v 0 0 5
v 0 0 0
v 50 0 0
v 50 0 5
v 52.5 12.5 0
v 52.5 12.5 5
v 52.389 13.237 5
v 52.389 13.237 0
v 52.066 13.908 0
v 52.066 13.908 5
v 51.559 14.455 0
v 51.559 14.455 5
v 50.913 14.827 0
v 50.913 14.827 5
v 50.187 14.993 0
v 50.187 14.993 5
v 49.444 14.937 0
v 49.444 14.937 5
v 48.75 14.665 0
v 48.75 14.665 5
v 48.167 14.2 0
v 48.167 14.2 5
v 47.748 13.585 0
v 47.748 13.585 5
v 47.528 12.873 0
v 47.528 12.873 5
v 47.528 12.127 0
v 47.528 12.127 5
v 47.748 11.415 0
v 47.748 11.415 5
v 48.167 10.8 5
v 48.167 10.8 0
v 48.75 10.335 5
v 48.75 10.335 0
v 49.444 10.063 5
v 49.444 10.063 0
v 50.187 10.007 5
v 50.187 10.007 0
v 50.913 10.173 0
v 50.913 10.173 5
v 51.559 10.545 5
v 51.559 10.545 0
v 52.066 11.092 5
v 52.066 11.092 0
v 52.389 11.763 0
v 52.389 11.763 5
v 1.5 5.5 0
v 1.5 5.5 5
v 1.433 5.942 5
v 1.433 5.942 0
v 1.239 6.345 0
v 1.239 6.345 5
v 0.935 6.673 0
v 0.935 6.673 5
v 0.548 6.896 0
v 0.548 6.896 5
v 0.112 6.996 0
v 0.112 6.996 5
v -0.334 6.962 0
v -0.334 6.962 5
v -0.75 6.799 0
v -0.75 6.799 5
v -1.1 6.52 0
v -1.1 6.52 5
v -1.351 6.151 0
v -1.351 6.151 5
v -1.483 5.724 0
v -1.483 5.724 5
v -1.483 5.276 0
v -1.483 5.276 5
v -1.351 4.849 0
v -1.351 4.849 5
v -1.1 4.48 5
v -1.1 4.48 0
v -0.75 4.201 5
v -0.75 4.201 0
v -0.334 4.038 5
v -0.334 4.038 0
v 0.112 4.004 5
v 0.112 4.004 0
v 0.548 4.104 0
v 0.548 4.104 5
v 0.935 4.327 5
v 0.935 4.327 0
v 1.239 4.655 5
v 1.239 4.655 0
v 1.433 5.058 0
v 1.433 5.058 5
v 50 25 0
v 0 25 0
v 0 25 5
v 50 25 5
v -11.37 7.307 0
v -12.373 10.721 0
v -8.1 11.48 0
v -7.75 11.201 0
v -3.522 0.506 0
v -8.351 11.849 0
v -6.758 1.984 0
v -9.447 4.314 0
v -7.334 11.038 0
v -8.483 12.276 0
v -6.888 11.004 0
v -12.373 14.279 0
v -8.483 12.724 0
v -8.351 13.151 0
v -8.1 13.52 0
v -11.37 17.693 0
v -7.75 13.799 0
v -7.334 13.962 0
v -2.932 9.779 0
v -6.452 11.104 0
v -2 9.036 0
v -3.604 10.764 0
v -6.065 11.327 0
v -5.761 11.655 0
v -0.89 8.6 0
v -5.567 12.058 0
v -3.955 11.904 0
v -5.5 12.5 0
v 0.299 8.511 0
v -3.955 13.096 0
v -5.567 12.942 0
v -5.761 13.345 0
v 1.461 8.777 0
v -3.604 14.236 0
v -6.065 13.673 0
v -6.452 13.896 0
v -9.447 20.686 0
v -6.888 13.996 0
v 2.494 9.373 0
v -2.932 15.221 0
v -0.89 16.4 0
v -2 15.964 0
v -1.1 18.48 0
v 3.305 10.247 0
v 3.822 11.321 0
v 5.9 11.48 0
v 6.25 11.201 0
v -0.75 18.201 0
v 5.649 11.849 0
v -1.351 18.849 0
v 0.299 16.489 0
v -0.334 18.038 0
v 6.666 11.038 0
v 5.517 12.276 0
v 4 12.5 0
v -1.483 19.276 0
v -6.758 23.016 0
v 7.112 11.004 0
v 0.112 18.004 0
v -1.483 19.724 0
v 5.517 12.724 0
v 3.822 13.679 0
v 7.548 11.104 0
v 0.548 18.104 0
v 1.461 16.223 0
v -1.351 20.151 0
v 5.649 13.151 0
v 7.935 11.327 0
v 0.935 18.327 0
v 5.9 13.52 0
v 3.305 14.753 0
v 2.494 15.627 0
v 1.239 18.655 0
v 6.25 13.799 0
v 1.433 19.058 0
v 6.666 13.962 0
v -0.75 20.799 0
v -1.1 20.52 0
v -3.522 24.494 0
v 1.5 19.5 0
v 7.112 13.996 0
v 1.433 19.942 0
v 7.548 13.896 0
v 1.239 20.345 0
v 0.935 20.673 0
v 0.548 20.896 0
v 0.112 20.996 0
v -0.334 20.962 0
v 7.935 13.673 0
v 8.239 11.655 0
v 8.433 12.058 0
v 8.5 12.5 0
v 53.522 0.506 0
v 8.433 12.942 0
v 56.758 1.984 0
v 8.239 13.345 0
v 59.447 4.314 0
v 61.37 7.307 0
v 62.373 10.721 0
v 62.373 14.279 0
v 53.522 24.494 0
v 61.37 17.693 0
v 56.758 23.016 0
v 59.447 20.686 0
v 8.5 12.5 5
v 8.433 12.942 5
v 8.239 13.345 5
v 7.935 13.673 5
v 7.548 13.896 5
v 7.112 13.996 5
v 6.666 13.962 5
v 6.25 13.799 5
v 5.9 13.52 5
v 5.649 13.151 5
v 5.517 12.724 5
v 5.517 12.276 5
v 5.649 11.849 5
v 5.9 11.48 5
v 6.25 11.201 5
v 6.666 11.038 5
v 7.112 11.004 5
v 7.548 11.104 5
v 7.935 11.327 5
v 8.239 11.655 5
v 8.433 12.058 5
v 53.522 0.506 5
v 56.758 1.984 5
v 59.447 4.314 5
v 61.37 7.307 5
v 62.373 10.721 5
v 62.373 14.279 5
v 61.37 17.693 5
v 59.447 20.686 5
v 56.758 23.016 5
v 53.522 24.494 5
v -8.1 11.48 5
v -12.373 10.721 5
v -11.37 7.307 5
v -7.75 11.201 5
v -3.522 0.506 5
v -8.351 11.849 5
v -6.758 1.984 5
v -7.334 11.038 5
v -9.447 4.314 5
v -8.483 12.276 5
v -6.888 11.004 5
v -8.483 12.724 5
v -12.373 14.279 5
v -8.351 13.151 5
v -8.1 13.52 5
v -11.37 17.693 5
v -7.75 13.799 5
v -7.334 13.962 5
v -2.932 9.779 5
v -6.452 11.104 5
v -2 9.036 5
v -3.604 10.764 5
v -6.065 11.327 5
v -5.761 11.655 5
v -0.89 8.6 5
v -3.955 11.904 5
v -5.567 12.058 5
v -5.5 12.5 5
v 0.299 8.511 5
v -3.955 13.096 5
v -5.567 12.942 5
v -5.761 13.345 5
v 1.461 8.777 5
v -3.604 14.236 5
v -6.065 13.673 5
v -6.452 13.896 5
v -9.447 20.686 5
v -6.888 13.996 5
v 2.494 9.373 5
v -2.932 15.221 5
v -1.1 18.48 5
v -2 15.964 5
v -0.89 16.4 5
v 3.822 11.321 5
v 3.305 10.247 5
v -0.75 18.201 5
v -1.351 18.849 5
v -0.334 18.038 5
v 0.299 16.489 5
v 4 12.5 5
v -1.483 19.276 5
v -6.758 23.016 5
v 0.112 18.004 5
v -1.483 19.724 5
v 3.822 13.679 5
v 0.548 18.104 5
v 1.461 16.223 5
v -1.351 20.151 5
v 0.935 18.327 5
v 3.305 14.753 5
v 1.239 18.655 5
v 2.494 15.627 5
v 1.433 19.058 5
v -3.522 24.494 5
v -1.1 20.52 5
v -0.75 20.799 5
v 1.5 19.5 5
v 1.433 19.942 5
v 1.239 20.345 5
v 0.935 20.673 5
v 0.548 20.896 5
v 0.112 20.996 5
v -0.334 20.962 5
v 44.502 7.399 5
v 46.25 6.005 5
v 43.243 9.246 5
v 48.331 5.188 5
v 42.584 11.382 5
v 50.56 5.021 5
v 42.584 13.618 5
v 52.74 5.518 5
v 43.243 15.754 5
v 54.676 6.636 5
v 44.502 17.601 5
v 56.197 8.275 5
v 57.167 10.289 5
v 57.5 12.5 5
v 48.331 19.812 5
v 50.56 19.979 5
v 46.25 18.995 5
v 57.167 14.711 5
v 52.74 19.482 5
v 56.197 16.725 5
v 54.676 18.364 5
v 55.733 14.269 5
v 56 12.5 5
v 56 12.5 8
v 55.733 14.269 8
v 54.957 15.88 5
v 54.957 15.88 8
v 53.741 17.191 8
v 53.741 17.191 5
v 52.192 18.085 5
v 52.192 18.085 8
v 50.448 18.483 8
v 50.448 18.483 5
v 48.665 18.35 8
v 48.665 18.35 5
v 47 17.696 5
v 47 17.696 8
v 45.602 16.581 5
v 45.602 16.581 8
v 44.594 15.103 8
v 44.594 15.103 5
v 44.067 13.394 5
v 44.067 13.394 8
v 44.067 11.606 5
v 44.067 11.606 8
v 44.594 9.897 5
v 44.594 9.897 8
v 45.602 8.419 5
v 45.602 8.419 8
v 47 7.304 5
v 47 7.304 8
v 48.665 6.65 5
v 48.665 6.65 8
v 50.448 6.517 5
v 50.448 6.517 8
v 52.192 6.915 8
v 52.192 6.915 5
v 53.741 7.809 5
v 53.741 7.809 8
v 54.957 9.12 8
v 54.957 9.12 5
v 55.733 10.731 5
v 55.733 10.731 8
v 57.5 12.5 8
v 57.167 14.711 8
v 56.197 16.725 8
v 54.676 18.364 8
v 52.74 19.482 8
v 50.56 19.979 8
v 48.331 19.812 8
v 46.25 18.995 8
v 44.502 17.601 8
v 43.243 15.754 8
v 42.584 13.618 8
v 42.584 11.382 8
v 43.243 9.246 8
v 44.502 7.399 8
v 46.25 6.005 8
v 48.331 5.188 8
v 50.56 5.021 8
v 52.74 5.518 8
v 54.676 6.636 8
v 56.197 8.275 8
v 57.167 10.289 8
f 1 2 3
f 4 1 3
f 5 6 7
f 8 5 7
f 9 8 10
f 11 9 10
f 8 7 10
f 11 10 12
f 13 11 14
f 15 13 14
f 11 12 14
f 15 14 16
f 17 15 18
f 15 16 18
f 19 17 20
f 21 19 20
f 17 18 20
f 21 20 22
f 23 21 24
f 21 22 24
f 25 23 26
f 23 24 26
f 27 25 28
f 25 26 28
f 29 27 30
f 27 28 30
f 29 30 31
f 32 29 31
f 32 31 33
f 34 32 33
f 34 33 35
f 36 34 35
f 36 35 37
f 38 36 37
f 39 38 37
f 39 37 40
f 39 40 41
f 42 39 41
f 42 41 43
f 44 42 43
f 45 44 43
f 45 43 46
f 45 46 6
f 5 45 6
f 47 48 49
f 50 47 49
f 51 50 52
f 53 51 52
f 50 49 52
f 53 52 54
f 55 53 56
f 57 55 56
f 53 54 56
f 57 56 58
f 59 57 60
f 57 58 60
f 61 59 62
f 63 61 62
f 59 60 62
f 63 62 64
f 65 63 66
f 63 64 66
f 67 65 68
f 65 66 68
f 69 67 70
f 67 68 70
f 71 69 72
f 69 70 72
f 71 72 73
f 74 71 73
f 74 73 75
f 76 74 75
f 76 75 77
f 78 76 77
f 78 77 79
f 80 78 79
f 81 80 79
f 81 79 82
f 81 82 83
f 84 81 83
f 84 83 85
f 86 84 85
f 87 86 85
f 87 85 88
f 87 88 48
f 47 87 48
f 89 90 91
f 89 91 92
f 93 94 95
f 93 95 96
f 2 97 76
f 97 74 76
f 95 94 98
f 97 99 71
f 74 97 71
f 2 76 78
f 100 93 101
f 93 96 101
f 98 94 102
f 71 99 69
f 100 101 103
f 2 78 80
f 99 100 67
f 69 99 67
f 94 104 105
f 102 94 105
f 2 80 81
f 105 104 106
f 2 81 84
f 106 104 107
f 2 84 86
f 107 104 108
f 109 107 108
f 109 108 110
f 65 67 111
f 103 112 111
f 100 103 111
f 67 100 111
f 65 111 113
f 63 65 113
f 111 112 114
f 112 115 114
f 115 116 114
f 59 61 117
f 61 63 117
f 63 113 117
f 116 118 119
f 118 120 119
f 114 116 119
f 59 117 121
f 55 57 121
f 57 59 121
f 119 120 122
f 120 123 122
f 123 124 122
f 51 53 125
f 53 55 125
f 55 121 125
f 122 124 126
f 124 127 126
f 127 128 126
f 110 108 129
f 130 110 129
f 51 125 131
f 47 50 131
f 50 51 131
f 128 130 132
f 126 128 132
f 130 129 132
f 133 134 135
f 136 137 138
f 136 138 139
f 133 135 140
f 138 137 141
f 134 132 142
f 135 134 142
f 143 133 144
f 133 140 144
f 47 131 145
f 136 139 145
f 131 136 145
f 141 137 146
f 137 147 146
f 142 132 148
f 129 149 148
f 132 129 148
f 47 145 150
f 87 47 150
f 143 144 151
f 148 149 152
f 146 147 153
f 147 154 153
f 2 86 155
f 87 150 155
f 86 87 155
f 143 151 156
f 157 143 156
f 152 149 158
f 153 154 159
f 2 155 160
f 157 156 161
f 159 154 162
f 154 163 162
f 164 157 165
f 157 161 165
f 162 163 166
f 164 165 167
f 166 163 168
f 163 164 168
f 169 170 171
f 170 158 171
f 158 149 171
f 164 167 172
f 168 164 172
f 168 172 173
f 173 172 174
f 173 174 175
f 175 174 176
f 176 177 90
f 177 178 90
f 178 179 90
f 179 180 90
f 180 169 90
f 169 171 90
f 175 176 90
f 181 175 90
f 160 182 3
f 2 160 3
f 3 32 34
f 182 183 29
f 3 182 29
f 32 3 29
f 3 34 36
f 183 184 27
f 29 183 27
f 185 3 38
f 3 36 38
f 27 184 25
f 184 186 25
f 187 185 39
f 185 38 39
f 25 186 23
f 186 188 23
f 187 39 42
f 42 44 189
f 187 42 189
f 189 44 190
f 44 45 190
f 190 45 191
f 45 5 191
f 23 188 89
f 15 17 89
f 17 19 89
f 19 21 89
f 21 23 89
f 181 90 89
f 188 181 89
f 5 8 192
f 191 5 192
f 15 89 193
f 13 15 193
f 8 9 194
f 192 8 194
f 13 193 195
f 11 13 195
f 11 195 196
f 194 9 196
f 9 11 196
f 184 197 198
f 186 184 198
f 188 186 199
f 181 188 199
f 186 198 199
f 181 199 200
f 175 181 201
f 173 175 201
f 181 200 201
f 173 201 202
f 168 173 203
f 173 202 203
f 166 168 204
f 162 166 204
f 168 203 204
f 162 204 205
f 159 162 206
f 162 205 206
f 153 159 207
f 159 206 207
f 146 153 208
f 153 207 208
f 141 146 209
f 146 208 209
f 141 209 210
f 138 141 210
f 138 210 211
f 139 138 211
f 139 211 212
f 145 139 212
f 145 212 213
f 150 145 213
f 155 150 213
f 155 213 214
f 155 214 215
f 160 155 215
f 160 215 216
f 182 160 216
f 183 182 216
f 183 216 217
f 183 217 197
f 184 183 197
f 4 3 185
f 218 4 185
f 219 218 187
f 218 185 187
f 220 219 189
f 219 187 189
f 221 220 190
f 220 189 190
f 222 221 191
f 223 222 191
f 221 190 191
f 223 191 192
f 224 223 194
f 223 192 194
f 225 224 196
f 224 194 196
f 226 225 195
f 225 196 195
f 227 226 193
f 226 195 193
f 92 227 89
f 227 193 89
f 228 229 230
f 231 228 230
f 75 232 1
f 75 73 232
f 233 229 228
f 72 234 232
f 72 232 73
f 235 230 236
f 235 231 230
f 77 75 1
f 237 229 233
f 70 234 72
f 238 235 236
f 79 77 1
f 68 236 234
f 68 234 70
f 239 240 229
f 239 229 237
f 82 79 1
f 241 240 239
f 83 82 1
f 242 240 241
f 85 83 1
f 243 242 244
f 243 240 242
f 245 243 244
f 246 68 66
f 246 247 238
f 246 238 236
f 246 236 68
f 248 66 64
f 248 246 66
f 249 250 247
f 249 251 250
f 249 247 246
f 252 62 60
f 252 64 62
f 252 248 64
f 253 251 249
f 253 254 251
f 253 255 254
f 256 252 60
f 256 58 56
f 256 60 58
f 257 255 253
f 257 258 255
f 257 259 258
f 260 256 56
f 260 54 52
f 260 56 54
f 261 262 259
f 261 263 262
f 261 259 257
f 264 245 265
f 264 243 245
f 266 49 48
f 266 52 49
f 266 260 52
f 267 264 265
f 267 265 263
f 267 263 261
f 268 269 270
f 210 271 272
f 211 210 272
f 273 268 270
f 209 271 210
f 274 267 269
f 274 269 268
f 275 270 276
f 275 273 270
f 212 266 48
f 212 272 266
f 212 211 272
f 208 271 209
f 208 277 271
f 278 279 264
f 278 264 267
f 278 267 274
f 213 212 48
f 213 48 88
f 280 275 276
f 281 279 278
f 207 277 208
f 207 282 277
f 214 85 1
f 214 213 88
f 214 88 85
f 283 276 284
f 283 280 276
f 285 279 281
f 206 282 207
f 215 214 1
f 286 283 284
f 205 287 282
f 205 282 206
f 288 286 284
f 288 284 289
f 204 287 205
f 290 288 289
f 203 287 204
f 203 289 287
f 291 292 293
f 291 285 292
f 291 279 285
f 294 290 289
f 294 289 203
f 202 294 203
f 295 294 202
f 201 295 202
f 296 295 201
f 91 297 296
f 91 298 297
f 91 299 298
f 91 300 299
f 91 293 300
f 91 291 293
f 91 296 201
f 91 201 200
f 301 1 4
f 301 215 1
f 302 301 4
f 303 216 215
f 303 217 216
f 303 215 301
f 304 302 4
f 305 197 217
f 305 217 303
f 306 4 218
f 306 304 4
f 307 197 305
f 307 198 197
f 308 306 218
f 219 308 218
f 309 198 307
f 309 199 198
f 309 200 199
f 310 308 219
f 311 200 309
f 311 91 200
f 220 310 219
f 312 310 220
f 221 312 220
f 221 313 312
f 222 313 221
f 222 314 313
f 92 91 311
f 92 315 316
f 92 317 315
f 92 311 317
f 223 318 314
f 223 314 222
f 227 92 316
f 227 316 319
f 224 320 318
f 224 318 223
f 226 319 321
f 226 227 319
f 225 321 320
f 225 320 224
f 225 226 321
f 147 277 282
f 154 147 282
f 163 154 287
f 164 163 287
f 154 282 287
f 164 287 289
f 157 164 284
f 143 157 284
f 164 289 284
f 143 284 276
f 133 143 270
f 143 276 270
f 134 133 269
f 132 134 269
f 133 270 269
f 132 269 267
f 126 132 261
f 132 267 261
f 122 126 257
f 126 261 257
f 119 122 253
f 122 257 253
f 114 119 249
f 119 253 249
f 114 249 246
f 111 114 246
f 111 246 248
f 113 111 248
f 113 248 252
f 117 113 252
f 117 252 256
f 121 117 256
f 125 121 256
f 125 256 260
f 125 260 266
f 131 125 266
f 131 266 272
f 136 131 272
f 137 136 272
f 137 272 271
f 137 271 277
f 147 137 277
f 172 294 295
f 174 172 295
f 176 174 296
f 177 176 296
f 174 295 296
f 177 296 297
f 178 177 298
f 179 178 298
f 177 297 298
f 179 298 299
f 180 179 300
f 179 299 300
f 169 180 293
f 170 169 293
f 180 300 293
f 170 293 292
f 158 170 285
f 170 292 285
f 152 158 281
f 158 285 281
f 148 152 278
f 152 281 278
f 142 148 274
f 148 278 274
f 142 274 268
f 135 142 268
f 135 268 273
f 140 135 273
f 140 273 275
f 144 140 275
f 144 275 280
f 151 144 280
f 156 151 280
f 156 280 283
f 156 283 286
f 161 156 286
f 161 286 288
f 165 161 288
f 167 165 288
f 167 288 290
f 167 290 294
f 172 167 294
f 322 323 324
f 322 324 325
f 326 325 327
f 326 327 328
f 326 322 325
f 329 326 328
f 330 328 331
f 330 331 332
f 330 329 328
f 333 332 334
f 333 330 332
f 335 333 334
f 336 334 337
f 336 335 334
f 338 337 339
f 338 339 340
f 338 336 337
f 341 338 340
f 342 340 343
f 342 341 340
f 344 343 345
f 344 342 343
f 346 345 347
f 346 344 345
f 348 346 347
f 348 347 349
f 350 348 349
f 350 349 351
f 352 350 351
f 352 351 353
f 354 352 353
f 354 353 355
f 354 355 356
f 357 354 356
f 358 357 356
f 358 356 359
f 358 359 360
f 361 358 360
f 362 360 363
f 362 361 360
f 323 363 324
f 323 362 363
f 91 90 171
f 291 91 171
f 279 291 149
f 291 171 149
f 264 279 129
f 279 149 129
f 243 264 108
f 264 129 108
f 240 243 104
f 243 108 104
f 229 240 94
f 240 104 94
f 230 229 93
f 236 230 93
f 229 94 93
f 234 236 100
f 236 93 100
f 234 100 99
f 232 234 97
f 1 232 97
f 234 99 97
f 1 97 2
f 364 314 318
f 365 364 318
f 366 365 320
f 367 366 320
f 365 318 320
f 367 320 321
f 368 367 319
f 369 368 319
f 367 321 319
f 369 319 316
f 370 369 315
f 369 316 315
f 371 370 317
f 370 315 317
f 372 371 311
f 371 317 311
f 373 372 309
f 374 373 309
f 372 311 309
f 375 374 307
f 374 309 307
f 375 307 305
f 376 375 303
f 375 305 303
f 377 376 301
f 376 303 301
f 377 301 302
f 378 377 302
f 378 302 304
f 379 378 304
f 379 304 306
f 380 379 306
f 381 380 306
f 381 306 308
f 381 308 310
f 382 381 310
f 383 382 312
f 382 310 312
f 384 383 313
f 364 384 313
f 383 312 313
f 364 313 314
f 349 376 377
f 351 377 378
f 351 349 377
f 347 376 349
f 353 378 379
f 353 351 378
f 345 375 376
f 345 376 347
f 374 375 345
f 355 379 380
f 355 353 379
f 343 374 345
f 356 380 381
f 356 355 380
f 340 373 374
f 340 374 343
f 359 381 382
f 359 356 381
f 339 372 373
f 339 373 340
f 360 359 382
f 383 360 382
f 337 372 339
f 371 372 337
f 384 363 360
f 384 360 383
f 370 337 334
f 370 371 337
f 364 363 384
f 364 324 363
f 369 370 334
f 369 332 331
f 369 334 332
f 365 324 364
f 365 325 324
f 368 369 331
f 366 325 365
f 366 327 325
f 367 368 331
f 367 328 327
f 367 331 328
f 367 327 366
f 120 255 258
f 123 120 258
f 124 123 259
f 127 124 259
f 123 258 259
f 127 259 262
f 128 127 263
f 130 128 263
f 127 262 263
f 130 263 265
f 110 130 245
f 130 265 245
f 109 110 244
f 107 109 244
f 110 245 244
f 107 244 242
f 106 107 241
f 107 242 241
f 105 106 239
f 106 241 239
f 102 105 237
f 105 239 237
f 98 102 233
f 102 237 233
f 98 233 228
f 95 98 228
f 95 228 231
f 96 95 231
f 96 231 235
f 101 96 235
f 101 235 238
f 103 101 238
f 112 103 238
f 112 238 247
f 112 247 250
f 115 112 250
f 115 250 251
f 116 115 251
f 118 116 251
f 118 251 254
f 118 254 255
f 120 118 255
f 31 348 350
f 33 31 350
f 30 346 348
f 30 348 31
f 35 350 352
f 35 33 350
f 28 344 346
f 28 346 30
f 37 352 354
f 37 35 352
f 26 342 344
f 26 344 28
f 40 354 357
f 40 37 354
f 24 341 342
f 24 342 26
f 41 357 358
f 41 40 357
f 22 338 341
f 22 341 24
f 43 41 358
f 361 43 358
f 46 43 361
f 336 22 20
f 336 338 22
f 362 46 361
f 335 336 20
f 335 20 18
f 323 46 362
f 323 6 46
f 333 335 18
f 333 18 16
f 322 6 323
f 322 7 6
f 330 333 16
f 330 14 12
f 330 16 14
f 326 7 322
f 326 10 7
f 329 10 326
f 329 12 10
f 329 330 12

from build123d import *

# Parameters (mm, degrees)
SKETCH1_R           = 12.5
SKETCH1_W           = 50
SKETCH1_H           = 25
BOSS_EXTRUDE2_DEPTH = 5
CUT_EXTRUDE3_REACH  = 69.5
SKETCH3_R           = 4
SKETCH3_R_2         = 2.5
SKETCH3_3_R         = 7.5
SKETCH3_3_R_2       = 6
BOSS_EXTRUDE3_DEPTH = 3
CUT_EXTRUDE4_REACH  = 69.5
SKETCH3_4_R         = 1.5


with BuildPart() as part:
    # Sketch1 → Boss-Extrude2 (new body)
    with BuildSketch(Plane.XY):
        with Locations((0, 12.5)):
            Circle(SKETCH1_R)
        with Locations((50, 12.5)):
            Circle(SKETCH1_R)
        with Locations((25, 12.5)):
            Rectangle(SKETCH1_W, SKETCH1_H)
    extrude(amount=BOSS_EXTRUDE2_DEPTH)

    # Sketch3 → Cut-Extrude3 (cut, up to next)
    with BuildSketch(Plane.XY.offset(5), mode=Mode.PRIVATE) as cut_extrude3_sk1:
        with Locations((0, 12.5)):
            Circle(SKETCH3_R)
    cut_extrude3_tool1 = extrude(cut_extrude3_sk1.sketch, amount=-CUT_EXTRUDE3_REACH, mode=Mode.PRIVATE) & part.part
    # Sketch3 → Cut-Extrude3 (cut, up to next)
    with BuildSketch(Plane.XY.offset(5), mode=Mode.PRIVATE) as cut_extrude3_sk2:
        with Locations((50, 12.5)):
            Circle(SKETCH3_R_2)
    cut_extrude3_tool2 = extrude(cut_extrude3_sk2.sketch, amount=-CUT_EXTRUDE3_REACH, mode=Mode.PRIVATE) & part.part
    add(cut_extrude3_tool1.solids().sort_by_distance((0, 12.5, 5))[0], mode=Mode.SUBTRACT)
    add(cut_extrude3_tool2.solids().sort_by_distance((50, 12.5, 5))[0], mode=Mode.SUBTRACT)

    # Sketch3<3> → Boss-Extrude3 (add)
    with BuildSketch(Plane.XY.offset(5)):
        with Locations((50, 12.5)):
            Circle(SKETCH3_3_R)
        with Locations((50, 12.5)):
            Circle(SKETCH3_3_R_2, mode=Mode.SUBTRACT)
    extrude(amount=BOSS_EXTRUDE3_DEPTH)

    # Sketch3<4> → Cut-Extrude4 (cut, up to next)
    with BuildSketch(Plane.XY.offset(5), mode=Mode.PRIVATE) as cut_extrude4_sk1:
        with Locations((-7, 12.5)):
            Circle(SKETCH3_4_R)
    cut_extrude4_tool1 = extrude(cut_extrude4_sk1.sketch, amount=-CUT_EXTRUDE4_REACH, mode=Mode.PRIVATE) & part.part
    # Sketch3<4> → Cut-Extrude4 (cut, up to next)
    with BuildSketch(Plane.XY.offset(5), mode=Mode.PRIVATE) as cut_extrude4_sk2:
        with Locations((0, 19.5)):
            Circle(SKETCH3_4_R)
    cut_extrude4_tool2 = extrude(cut_extrude4_sk2.sketch, amount=-CUT_EXTRUDE4_REACH, mode=Mode.PRIVATE) & part.part
    # Sketch3<4> → Cut-Extrude4 (cut, up to next)
    with BuildSketch(Plane.XY.offset(5), mode=Mode.PRIVATE) as cut_extrude4_sk3:
        with Locations((7, 12.5)):
            Circle(SKETCH3_4_R)
    cut_extrude4_tool3 = extrude(cut_extrude4_sk3.sketch, amount=-CUT_EXTRUDE4_REACH, mode=Mode.PRIVATE) & part.part
    # Sketch3<4> → Cut-Extrude4 (cut, up to next)
    with BuildSketch(Plane.XY.offset(5), mode=Mode.PRIVATE) as cut_extrude4_sk4:
        with Locations((0, 5.5)):
            Circle(SKETCH3_4_R)
    cut_extrude4_tool4 = extrude(cut_extrude4_sk4.sketch, amount=-CUT_EXTRUDE4_REACH, mode=Mode.PRIVATE) & part.part
    add(cut_extrude4_tool1.solids().sort_by_distance((-7, 12.5, 5))[0], mode=Mode.SUBTRACT)
    add(cut_extrude4_tool2.solids().sort_by_distance((0, 19.5, 5))[0], mode=Mode.SUBTRACT)
    add(cut_extrude4_tool3.solids().sort_by_distance((7, 12.5, 5))[0], mode=Mode.SUBTRACT)
    add(cut_extrude4_tool4.solids().sort_by_distance((0, 5.5, 5))[0], mode=Mode.SUBTRACT)


solid = part.part
